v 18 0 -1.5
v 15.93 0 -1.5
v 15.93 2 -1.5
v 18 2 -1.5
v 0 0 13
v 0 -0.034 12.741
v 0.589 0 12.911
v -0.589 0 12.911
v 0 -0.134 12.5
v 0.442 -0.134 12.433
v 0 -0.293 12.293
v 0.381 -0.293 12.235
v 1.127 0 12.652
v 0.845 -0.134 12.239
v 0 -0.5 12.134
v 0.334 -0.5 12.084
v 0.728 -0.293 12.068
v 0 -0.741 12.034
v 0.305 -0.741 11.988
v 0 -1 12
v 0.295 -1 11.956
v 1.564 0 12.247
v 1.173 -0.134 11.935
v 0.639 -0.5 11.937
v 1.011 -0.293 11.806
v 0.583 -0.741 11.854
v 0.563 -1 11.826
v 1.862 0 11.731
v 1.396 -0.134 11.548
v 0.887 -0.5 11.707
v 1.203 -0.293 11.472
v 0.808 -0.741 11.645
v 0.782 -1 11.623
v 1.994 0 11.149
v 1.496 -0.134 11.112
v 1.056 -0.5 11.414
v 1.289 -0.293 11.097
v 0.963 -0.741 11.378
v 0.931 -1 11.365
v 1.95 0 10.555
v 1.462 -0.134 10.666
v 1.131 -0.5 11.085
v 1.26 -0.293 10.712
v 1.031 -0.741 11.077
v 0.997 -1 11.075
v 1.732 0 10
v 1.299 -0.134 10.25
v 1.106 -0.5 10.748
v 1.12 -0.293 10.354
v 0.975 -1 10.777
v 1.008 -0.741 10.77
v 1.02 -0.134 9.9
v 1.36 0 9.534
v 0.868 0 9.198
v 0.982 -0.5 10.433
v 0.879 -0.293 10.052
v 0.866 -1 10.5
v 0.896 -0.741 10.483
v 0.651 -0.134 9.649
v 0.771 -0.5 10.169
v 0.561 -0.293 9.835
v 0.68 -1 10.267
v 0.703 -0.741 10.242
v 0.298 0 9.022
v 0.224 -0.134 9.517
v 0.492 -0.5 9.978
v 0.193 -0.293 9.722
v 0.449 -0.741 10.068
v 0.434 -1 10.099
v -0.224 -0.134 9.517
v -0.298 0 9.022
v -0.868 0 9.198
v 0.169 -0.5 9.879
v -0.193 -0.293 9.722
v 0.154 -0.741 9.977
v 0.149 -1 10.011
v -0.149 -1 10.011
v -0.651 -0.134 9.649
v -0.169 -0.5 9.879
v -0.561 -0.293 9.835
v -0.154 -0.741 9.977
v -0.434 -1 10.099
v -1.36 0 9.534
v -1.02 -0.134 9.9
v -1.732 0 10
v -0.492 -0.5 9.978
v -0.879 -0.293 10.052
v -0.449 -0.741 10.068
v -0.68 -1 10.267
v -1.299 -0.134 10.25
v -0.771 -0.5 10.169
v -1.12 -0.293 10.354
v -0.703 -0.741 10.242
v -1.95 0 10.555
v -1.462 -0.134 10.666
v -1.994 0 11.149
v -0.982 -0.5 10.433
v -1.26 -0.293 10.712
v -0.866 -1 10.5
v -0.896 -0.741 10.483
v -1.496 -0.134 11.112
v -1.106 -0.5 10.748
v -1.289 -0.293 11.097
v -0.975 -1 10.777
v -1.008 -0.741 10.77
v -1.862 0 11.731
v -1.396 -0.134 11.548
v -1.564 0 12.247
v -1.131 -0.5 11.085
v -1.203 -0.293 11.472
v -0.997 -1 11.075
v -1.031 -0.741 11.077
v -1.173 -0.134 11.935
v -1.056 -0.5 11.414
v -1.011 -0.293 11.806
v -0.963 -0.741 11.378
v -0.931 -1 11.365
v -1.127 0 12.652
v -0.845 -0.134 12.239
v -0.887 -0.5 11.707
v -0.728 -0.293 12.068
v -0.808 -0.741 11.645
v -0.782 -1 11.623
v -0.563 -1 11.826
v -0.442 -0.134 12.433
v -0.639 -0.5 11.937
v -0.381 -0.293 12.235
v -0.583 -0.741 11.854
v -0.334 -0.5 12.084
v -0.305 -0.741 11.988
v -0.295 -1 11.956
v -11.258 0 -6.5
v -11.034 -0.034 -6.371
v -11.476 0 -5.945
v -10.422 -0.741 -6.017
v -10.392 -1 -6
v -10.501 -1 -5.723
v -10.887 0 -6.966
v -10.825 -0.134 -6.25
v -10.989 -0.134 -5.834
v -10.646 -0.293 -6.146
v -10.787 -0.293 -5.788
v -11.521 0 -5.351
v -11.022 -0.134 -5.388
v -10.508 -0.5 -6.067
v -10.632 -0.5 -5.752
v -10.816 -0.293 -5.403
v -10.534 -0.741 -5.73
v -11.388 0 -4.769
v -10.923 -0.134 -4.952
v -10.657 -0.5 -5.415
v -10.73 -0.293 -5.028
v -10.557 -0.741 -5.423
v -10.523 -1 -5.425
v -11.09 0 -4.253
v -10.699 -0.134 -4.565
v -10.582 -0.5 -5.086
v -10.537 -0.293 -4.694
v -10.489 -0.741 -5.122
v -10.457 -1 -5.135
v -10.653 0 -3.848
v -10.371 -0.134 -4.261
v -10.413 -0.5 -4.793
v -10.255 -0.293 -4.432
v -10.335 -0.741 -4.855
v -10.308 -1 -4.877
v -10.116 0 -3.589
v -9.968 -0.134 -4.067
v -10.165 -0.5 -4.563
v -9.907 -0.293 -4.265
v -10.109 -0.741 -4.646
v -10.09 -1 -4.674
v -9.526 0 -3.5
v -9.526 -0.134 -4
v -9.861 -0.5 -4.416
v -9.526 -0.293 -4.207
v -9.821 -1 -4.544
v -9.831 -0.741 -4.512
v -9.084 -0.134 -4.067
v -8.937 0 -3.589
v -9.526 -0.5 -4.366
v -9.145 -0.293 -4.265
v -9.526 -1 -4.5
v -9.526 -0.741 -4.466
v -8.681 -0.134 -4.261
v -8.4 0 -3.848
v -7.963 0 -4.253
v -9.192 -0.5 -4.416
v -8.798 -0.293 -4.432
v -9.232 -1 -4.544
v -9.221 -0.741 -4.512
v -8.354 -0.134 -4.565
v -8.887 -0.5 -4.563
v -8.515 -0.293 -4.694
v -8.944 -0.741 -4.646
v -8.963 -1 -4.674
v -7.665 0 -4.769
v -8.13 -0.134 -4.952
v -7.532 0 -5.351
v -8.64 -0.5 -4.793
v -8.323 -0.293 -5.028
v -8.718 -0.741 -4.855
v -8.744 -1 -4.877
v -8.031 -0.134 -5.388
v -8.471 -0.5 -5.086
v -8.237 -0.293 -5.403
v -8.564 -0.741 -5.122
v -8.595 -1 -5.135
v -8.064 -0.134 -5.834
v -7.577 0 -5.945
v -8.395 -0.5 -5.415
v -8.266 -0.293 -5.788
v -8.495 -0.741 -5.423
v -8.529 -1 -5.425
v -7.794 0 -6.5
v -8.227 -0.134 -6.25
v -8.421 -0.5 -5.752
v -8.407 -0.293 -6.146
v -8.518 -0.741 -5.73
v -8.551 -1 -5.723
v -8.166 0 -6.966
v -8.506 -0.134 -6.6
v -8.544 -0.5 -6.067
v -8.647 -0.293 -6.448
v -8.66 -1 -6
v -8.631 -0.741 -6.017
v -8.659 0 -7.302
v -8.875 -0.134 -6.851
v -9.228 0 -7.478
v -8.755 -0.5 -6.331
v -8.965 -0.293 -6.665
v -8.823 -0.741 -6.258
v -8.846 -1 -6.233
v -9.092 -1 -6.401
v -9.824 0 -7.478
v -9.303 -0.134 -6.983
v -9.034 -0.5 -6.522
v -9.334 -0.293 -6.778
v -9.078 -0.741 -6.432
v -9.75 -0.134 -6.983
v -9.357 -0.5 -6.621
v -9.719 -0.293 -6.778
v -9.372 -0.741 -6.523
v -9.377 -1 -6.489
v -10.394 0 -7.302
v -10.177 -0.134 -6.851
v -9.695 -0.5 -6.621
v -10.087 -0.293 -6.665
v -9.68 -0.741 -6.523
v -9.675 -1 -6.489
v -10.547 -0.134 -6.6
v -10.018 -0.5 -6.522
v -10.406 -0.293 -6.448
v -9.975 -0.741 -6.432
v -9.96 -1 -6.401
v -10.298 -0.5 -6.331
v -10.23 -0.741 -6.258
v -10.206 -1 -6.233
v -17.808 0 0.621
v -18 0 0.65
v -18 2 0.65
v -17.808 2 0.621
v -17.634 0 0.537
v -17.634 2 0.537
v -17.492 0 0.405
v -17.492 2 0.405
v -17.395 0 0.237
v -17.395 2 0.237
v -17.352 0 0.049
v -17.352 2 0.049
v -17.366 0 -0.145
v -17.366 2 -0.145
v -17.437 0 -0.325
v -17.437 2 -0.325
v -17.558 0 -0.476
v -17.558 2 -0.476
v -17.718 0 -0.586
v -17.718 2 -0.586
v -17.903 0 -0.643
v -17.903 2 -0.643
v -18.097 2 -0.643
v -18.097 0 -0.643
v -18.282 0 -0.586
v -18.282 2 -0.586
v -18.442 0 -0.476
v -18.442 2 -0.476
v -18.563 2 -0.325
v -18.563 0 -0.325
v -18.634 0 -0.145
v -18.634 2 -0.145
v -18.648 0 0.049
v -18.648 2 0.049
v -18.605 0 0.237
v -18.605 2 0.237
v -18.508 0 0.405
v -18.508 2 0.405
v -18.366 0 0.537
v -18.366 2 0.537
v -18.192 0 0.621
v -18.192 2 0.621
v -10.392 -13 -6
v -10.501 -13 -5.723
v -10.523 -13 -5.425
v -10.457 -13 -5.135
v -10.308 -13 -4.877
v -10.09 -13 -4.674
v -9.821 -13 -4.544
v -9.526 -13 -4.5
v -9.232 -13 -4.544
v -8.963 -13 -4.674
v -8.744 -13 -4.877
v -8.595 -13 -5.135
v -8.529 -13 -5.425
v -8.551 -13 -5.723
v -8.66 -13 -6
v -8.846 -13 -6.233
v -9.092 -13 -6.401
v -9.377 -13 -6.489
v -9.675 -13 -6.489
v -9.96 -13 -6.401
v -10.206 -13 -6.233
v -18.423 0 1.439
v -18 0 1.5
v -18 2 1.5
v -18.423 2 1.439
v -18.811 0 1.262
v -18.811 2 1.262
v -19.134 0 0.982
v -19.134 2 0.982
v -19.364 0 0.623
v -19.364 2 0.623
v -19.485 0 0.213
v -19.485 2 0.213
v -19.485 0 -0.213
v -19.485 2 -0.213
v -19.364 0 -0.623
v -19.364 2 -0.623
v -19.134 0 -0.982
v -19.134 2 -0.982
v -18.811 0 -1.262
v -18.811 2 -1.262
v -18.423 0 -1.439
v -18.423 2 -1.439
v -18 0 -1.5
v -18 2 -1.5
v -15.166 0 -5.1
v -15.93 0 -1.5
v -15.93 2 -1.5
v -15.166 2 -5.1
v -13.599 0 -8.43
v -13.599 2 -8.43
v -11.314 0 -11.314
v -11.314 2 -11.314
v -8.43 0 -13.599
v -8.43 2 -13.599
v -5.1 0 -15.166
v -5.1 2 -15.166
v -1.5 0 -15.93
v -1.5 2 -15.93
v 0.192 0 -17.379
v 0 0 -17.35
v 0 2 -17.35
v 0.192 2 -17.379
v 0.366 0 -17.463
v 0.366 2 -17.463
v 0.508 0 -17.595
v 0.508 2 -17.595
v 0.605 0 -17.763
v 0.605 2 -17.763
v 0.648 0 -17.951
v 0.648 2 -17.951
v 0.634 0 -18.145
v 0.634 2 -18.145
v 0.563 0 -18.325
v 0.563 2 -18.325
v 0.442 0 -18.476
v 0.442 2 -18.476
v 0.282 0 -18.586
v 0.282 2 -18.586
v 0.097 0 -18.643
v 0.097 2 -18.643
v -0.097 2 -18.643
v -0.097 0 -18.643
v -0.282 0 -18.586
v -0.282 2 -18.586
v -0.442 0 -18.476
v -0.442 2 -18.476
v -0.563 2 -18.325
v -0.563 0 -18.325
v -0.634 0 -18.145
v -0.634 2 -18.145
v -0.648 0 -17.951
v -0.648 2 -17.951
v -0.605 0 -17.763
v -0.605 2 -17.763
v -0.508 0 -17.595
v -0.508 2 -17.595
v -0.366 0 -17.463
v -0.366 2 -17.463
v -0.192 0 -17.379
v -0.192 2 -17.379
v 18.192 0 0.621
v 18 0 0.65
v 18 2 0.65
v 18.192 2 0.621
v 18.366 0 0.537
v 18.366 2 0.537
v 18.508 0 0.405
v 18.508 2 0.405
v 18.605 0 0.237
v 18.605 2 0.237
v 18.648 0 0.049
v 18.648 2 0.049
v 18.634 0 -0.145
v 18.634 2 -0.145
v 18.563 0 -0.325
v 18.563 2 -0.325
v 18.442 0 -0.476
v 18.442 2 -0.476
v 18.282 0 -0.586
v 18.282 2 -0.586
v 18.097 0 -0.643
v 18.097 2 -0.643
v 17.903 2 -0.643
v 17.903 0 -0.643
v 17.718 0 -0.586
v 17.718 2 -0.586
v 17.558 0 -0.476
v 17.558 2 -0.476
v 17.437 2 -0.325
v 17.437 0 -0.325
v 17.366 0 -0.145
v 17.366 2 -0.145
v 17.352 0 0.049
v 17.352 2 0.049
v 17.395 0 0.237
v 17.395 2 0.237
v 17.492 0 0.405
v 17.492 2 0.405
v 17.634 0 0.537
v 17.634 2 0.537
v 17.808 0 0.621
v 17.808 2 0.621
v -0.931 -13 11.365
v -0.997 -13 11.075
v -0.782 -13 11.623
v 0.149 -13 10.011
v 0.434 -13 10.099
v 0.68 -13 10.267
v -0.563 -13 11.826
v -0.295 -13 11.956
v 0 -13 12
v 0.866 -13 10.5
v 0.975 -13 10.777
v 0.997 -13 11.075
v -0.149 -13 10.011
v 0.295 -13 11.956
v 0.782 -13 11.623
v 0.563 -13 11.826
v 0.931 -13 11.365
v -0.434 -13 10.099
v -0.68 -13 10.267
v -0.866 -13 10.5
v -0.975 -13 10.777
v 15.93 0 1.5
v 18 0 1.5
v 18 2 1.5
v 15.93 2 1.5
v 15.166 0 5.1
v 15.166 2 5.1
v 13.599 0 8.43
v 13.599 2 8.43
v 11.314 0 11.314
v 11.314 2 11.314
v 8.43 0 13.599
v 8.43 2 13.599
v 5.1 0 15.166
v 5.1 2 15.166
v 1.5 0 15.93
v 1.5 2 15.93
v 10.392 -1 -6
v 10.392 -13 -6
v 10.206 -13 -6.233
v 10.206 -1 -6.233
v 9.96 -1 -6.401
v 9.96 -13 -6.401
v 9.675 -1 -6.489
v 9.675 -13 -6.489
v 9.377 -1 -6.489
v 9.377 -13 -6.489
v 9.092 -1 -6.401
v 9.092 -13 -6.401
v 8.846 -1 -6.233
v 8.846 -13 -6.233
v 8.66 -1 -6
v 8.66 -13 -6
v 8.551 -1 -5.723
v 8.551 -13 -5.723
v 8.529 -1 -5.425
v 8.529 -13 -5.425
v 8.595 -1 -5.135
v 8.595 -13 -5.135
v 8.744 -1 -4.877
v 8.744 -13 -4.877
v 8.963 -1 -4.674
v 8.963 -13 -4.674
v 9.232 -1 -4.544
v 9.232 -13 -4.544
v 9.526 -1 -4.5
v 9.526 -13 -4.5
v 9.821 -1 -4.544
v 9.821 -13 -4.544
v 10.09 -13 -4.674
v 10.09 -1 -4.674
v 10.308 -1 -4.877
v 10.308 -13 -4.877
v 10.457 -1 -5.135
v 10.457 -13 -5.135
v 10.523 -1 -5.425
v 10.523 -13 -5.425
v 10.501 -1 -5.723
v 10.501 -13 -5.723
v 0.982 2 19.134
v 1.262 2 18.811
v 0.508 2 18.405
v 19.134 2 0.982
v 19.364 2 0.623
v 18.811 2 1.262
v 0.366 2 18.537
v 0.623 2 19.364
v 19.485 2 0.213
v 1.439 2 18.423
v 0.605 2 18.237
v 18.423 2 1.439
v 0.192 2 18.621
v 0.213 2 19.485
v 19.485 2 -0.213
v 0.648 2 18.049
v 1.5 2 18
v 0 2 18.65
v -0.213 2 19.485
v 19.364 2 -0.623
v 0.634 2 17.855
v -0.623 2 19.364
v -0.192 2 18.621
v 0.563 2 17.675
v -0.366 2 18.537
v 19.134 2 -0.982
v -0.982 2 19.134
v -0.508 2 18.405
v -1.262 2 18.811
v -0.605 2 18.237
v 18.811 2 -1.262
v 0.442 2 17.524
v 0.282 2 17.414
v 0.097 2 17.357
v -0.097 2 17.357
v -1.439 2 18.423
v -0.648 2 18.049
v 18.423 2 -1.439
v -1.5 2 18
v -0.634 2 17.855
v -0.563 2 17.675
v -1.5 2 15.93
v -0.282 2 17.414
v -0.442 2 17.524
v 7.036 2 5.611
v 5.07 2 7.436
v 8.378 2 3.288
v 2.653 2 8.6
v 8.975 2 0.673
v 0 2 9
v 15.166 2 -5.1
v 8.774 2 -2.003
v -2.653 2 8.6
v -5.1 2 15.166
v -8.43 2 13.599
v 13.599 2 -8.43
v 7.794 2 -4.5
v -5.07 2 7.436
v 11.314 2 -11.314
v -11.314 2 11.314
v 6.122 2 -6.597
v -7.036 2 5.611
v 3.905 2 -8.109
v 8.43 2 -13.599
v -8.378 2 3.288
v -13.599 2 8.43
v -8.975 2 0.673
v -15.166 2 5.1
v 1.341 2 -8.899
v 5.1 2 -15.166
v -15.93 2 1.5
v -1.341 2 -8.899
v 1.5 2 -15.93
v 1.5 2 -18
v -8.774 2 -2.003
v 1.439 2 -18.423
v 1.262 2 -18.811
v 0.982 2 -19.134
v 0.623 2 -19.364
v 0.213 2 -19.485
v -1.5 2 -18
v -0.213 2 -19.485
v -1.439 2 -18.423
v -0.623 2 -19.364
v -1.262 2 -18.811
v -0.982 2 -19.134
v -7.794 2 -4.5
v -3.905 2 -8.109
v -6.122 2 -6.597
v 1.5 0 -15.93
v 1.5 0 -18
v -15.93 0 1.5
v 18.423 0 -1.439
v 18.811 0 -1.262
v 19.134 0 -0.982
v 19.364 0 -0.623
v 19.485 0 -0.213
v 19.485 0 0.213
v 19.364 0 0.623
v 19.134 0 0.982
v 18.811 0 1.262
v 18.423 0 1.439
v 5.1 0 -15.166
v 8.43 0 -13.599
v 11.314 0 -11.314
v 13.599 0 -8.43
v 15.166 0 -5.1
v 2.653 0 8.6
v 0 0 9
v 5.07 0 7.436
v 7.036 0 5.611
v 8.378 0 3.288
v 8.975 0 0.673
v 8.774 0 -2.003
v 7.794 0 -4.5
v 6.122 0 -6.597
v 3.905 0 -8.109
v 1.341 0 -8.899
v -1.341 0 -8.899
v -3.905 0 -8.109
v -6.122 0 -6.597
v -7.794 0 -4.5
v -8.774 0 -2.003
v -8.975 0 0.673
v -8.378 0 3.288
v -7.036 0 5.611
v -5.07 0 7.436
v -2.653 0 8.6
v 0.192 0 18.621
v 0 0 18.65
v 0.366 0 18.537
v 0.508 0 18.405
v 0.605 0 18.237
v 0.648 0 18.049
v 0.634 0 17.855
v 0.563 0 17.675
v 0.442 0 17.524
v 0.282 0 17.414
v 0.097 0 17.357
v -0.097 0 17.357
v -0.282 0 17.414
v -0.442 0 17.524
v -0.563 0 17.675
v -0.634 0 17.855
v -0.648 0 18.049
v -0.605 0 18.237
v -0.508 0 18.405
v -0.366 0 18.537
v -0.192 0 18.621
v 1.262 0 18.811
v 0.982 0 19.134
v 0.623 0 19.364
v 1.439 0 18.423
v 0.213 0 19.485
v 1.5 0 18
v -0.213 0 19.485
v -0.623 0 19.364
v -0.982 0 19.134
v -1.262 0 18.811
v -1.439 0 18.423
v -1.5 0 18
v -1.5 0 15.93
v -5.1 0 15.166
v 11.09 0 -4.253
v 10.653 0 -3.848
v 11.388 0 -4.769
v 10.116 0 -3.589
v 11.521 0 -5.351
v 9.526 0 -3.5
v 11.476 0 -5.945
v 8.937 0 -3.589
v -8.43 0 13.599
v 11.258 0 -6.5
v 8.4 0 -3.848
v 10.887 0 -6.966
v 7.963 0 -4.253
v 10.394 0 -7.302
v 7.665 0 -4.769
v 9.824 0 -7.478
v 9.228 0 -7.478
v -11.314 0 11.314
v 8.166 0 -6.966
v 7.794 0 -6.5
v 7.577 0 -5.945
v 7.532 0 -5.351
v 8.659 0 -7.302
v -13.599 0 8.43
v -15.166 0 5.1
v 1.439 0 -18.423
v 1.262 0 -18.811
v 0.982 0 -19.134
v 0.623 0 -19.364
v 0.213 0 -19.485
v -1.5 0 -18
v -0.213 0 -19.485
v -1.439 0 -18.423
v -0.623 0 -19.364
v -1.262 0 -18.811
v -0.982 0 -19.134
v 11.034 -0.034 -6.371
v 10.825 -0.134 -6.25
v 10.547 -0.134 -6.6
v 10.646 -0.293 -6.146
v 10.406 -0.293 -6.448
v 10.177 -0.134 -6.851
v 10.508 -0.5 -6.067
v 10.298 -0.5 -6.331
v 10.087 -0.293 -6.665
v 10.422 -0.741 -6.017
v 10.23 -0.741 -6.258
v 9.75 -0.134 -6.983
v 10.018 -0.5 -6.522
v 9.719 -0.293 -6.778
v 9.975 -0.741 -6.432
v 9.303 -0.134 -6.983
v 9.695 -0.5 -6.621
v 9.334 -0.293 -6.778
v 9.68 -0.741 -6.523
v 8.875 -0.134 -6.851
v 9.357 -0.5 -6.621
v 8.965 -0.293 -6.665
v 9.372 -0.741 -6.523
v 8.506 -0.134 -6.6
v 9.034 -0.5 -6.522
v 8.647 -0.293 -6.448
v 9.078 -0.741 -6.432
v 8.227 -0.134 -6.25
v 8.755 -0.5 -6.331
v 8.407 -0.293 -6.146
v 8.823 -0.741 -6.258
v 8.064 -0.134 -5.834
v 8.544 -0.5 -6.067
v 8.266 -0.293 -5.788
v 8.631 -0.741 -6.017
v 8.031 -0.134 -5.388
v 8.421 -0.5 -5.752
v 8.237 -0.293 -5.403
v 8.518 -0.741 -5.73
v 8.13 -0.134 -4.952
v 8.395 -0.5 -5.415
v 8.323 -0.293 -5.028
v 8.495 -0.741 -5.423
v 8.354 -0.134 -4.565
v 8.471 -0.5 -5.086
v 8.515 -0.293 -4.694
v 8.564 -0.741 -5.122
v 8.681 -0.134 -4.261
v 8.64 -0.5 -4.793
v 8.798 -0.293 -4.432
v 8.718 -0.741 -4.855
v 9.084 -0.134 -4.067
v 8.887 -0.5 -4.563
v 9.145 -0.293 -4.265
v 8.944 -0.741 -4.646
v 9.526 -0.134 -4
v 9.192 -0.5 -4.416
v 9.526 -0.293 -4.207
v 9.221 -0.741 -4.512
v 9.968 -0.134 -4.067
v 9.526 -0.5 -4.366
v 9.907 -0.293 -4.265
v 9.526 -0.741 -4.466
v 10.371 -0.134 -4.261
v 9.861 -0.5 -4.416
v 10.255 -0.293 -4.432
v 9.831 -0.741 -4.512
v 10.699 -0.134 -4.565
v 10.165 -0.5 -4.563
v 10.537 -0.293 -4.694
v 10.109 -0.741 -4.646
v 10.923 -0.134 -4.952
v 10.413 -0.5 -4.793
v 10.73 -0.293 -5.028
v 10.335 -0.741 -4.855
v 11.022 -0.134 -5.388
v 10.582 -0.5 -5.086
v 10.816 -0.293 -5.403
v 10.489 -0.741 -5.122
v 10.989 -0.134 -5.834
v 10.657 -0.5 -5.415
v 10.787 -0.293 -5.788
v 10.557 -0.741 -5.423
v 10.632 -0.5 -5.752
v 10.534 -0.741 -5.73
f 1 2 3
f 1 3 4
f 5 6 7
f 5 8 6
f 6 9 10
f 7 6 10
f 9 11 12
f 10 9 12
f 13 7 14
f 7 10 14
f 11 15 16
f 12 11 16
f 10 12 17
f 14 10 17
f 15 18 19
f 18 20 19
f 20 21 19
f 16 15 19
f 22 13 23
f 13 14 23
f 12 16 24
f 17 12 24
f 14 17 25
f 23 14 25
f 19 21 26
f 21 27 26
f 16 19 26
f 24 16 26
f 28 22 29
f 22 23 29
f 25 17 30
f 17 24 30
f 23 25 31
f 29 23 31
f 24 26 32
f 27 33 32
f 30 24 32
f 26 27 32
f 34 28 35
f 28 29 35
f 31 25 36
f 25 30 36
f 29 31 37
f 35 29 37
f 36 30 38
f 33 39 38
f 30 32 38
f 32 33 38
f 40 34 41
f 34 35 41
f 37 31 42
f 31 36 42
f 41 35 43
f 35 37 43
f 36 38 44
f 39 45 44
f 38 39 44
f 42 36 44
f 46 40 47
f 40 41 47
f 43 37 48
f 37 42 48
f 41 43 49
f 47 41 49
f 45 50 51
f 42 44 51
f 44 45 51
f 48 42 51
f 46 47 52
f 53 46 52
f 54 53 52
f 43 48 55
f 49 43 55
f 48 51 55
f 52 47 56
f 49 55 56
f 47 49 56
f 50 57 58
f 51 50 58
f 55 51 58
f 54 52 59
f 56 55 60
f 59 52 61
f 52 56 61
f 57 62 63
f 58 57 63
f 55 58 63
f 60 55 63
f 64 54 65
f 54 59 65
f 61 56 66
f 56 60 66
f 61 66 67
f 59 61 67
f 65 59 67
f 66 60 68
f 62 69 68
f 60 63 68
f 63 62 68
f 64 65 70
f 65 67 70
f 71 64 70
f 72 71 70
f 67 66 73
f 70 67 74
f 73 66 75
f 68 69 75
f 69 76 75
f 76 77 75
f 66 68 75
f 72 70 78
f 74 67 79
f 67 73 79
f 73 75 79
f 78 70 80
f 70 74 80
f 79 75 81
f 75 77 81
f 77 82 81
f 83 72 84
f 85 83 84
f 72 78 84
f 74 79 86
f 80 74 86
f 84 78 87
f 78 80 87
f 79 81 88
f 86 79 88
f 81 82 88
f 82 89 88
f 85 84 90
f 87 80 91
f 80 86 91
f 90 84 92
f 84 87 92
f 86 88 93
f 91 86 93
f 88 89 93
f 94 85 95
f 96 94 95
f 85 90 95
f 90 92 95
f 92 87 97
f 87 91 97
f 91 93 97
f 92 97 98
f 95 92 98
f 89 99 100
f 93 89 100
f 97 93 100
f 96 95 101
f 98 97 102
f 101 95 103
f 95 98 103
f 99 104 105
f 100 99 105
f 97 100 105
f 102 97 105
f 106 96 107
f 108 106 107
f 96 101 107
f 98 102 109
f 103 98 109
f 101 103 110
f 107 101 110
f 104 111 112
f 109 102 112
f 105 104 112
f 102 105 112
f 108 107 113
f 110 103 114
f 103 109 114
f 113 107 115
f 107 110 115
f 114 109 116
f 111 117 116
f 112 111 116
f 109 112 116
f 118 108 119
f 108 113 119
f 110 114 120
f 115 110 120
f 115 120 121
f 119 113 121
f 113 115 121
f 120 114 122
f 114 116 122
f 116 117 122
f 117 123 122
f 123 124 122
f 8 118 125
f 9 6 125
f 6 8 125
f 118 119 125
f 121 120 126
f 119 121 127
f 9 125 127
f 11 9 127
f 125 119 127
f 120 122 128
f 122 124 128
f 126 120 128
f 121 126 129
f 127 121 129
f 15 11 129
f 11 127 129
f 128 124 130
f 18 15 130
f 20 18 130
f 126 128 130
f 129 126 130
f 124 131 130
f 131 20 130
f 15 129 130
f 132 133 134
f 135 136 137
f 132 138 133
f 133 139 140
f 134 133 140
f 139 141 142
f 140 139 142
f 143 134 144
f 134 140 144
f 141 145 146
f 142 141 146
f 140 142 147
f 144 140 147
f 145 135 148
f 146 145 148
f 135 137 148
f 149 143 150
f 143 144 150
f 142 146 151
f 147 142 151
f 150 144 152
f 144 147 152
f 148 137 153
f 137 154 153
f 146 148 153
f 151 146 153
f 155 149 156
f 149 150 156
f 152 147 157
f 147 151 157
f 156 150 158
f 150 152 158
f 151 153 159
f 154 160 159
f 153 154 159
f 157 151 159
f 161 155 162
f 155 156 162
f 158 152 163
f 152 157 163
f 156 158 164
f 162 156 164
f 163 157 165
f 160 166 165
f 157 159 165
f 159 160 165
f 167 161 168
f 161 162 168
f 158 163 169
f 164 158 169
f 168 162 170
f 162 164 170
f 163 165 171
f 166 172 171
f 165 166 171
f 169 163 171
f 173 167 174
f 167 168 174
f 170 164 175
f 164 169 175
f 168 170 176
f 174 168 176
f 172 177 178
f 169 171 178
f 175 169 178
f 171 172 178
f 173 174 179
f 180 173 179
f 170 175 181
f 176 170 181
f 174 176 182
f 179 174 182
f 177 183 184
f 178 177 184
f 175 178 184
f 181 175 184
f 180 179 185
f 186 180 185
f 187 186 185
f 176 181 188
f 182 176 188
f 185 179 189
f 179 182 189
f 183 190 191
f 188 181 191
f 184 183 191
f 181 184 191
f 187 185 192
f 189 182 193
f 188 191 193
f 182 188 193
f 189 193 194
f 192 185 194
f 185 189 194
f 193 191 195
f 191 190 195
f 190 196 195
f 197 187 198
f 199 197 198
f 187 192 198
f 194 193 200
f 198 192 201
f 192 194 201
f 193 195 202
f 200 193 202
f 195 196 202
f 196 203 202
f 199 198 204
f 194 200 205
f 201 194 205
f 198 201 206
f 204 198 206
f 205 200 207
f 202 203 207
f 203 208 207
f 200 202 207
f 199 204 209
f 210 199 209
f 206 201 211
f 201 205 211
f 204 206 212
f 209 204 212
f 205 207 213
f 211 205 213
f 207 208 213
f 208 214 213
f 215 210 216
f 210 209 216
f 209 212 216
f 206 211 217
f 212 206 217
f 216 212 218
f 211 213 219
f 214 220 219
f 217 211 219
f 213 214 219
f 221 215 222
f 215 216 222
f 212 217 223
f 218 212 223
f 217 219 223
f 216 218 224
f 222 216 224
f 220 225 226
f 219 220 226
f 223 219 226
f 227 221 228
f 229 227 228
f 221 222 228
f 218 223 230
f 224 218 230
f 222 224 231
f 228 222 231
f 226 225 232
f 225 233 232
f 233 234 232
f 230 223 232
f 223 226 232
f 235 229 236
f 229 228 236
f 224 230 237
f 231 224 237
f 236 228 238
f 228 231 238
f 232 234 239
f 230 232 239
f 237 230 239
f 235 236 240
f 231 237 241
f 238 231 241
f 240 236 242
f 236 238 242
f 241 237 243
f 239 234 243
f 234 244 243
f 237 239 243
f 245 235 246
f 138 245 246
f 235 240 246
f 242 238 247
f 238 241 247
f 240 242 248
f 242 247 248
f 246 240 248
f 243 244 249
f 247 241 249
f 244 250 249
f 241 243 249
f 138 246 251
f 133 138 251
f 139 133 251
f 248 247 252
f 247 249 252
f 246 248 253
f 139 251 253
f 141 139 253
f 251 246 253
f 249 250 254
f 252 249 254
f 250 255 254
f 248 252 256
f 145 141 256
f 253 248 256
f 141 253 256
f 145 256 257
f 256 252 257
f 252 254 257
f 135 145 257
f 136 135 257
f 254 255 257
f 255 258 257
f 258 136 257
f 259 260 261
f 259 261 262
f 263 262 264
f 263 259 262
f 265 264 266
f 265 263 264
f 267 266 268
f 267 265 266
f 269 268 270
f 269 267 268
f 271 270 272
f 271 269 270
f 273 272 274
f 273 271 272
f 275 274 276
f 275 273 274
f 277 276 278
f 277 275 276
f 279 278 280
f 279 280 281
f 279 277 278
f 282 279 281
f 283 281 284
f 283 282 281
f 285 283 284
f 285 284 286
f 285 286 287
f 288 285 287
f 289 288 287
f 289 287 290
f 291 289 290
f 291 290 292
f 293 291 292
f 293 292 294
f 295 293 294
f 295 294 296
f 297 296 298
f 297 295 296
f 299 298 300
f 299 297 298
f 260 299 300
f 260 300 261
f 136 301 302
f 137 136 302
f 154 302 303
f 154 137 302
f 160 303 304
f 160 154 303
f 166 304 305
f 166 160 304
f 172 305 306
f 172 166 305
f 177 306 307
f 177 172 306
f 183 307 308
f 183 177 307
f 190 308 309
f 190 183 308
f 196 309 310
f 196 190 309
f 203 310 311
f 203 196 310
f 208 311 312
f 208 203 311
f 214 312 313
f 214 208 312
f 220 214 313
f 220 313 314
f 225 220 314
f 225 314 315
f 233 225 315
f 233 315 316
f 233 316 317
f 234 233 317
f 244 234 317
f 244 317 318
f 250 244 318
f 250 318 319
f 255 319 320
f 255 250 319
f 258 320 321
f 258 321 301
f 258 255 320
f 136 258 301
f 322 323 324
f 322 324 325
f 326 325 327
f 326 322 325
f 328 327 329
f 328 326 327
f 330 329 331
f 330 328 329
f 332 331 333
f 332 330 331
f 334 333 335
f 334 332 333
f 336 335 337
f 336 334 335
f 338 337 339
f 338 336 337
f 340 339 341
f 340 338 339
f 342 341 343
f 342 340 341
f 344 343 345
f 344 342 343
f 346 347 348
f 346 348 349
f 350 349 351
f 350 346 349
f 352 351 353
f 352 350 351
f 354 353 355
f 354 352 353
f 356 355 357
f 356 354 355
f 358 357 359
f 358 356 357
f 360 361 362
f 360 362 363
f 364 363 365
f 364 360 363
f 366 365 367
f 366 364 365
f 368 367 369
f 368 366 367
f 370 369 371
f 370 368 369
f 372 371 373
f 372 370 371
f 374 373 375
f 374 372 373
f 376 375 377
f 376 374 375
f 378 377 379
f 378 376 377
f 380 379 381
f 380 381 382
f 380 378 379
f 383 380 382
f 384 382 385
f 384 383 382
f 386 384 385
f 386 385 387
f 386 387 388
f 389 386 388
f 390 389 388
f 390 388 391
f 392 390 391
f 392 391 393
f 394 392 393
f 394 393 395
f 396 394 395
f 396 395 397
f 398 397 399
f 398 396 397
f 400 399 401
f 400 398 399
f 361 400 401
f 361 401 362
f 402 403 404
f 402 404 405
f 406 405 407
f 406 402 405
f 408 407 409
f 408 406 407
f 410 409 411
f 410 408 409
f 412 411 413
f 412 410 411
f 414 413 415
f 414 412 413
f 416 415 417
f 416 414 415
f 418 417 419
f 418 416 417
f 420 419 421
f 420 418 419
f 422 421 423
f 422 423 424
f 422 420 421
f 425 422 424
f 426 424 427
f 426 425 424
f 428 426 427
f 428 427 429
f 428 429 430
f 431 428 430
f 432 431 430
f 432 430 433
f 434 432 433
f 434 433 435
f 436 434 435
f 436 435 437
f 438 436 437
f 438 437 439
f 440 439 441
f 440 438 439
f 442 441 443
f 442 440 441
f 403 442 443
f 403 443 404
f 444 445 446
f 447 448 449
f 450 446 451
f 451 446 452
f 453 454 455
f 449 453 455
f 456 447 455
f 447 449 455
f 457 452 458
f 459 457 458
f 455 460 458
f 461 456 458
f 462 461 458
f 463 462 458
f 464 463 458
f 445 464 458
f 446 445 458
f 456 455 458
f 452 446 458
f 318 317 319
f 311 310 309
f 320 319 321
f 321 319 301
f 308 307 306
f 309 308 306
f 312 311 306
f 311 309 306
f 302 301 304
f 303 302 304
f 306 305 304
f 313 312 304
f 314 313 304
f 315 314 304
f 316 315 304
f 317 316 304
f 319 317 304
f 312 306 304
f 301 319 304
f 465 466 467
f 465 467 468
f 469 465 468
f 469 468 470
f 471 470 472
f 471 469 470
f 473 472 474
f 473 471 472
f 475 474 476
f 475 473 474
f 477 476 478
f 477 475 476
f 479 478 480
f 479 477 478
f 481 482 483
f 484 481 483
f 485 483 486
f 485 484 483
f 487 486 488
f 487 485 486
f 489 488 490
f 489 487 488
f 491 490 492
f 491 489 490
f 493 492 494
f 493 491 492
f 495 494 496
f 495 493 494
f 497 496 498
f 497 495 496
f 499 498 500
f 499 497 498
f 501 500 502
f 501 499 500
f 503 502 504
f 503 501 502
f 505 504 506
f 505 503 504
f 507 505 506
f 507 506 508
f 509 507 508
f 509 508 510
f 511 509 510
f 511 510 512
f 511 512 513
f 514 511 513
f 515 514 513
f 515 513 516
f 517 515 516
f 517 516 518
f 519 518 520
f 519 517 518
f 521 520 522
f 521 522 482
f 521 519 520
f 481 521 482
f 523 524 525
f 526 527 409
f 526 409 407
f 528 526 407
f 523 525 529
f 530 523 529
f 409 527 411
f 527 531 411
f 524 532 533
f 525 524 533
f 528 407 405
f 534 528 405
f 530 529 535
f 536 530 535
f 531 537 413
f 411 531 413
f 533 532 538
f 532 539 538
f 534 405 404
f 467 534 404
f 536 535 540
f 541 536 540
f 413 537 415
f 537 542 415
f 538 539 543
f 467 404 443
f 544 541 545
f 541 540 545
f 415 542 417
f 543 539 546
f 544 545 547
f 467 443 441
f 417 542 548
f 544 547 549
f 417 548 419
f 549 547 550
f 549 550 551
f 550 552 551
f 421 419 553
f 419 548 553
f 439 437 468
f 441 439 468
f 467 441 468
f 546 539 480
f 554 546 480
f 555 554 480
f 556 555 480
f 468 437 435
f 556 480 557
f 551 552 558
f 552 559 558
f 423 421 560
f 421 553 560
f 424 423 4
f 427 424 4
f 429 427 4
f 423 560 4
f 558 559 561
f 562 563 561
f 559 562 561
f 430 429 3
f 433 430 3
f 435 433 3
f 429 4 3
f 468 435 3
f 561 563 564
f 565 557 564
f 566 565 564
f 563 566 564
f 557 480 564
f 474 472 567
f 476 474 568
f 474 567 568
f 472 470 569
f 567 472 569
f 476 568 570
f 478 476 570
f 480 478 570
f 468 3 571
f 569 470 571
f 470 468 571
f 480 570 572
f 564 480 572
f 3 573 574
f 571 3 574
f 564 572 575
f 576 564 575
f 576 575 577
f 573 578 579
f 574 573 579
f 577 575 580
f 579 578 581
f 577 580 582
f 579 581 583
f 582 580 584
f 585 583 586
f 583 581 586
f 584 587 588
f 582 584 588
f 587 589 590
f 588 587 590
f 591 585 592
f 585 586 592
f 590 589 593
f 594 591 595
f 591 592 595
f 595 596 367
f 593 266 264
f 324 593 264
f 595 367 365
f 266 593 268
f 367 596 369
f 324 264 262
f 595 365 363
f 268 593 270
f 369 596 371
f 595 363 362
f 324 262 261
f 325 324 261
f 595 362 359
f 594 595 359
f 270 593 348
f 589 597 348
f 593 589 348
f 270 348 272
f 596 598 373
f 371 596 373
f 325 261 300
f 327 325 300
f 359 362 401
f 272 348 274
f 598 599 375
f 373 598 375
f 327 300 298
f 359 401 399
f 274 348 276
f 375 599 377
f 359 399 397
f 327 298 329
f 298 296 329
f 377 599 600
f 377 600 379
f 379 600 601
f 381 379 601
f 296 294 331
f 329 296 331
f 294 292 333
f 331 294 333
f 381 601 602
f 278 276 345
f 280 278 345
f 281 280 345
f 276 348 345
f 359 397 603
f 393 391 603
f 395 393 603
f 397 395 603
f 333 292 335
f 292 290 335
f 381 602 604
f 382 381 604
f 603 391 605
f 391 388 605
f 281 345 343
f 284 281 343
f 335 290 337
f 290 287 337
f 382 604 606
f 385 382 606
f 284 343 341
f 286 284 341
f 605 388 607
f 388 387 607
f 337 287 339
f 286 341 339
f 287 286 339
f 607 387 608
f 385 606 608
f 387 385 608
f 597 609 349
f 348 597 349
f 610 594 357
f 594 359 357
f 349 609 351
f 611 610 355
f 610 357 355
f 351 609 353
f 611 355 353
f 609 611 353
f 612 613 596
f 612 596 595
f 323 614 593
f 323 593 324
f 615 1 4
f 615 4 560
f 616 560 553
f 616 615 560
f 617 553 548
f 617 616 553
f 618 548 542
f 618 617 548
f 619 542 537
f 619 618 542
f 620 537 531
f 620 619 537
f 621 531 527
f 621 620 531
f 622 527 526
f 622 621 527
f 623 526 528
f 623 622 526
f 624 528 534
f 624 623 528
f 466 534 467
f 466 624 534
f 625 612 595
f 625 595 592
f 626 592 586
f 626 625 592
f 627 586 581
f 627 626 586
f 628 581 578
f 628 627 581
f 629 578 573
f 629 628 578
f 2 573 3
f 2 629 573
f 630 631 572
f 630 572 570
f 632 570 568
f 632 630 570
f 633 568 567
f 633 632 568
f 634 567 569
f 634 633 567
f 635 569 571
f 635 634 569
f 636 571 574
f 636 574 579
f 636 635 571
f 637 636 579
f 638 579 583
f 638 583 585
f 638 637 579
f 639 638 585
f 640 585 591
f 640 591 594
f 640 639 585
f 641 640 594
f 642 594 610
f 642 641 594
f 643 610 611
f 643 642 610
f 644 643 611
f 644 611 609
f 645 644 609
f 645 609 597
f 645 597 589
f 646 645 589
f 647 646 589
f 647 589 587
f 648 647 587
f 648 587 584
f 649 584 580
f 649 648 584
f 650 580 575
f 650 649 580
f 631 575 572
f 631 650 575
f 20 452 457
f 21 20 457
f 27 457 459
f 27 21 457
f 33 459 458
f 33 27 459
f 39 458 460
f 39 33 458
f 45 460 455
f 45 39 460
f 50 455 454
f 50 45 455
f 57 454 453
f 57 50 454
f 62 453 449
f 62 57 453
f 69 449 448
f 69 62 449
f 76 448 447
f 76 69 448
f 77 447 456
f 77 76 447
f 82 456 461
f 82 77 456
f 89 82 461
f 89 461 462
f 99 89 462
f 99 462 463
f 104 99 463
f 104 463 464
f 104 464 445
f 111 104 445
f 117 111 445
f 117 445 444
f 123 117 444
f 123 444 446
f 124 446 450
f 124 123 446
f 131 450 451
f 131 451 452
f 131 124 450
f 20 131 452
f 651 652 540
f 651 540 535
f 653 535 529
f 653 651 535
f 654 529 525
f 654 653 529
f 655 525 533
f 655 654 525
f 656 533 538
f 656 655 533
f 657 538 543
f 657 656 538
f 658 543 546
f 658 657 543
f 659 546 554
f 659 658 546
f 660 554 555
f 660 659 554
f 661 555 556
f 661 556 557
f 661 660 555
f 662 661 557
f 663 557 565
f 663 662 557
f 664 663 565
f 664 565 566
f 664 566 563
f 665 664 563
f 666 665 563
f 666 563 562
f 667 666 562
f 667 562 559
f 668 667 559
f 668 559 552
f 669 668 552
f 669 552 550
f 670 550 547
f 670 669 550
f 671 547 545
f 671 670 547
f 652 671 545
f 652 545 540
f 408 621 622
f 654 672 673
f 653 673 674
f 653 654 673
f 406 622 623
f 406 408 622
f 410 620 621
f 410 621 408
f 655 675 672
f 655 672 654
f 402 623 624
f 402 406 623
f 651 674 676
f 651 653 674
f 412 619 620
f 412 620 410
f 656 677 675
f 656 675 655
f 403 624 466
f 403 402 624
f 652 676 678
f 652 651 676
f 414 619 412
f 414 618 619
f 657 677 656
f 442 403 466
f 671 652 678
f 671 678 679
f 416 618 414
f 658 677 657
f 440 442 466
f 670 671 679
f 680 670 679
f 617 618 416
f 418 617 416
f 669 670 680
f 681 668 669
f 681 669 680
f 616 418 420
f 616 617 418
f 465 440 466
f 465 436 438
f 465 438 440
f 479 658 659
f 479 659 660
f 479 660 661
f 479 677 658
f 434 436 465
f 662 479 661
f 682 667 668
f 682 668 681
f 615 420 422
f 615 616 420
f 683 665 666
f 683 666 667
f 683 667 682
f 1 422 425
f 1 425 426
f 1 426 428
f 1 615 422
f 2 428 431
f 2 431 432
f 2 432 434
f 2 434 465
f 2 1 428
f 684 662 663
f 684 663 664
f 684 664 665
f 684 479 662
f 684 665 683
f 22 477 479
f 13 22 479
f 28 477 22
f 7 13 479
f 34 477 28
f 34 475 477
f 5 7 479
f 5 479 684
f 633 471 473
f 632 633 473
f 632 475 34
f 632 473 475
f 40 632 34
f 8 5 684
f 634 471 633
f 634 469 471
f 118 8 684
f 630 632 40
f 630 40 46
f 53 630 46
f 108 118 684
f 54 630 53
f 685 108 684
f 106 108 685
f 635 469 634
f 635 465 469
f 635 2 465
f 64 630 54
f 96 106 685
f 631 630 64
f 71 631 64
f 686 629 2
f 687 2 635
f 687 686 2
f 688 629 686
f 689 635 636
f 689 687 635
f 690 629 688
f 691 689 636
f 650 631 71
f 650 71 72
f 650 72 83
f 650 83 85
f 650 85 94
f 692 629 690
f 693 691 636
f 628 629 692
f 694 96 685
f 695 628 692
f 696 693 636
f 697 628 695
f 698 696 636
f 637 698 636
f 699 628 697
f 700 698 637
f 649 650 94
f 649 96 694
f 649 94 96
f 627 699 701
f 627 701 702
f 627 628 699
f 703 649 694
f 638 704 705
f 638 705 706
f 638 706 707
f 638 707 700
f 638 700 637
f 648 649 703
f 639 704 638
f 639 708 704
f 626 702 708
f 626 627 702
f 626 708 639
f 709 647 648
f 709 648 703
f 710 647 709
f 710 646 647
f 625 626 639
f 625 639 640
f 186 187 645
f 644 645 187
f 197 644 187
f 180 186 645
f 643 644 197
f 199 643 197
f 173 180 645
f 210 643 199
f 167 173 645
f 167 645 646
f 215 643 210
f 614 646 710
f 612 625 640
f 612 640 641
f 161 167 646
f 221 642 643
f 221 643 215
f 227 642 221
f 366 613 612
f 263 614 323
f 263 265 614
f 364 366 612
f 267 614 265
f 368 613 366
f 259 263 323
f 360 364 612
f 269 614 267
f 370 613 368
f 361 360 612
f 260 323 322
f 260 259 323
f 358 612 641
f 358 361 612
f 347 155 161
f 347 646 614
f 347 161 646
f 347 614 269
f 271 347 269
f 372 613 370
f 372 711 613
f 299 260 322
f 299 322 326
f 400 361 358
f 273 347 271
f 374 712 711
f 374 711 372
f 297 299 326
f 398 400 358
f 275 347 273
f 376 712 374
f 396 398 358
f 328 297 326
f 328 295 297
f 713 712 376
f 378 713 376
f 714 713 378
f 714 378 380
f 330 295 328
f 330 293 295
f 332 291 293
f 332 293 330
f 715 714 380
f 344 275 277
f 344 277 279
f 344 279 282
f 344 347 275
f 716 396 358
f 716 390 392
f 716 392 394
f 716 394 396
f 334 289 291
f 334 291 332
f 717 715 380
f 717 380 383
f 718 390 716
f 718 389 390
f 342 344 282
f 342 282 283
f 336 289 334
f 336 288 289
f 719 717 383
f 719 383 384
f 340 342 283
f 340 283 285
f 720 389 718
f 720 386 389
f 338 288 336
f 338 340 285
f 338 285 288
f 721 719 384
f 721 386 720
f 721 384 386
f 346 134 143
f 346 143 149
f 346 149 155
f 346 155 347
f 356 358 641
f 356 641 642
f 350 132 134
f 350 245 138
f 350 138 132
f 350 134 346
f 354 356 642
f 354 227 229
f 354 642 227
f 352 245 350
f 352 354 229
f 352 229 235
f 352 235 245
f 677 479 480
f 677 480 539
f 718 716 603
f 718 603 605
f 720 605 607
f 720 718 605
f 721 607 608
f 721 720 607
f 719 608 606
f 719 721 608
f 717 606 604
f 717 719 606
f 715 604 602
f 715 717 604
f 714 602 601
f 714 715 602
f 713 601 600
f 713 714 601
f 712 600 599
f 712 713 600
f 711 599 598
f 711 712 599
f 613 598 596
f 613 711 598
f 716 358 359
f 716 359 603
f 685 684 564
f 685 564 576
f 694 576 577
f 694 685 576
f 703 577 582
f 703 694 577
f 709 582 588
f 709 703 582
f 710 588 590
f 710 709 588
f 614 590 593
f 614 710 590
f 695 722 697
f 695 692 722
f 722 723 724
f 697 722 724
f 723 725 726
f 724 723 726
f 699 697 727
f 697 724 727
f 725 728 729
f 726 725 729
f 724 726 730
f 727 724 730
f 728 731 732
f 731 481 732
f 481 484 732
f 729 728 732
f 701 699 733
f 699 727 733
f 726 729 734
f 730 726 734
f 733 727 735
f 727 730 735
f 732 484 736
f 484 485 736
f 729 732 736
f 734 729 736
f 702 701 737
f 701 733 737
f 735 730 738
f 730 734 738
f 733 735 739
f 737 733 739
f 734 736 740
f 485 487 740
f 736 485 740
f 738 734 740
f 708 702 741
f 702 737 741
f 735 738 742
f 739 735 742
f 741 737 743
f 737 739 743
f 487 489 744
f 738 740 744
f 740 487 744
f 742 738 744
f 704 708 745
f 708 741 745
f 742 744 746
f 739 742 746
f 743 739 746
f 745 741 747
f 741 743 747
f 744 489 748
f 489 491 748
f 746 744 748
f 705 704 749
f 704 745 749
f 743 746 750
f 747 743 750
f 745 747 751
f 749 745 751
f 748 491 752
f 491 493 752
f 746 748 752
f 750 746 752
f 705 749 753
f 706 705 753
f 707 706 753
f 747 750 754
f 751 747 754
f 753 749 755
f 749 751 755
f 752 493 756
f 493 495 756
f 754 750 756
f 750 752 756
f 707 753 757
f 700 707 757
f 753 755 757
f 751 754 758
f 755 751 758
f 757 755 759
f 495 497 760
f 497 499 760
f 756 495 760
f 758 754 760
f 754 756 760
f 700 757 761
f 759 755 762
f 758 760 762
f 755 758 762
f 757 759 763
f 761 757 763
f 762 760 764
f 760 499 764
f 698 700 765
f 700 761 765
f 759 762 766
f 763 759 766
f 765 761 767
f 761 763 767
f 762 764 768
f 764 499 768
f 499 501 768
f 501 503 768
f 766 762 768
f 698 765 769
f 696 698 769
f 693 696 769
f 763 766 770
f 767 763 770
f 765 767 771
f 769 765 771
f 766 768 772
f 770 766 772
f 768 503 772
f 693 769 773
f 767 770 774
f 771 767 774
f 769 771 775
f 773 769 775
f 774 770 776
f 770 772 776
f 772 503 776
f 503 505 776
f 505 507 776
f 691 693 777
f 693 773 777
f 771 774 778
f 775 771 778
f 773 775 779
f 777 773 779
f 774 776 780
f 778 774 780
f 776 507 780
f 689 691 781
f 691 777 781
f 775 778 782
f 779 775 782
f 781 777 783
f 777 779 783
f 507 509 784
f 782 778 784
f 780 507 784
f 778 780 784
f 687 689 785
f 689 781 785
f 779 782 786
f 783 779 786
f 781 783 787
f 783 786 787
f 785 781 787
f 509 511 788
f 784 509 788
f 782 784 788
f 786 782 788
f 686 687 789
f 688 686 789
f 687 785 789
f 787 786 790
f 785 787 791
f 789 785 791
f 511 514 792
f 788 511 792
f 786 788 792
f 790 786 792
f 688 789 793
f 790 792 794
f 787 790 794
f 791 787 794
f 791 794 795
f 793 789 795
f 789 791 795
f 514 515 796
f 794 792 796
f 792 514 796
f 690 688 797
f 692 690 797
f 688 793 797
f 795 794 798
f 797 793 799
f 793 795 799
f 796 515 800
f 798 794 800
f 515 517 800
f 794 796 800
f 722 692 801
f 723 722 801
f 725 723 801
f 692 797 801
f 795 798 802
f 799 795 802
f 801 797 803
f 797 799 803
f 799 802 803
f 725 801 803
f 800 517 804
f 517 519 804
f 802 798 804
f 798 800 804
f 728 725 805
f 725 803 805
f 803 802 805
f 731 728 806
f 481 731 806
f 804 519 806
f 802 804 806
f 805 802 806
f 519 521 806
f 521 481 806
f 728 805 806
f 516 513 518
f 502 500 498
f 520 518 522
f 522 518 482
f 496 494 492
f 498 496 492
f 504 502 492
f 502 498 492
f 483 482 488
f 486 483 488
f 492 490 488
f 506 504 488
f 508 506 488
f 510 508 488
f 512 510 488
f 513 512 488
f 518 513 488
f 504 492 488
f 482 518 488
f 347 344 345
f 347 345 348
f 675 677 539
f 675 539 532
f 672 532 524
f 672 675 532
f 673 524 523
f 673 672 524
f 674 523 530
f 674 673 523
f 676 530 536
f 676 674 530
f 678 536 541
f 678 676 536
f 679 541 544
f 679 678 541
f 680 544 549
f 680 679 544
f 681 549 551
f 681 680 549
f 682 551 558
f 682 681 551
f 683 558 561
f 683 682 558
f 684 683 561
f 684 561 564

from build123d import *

# Parameters (mm, degrees)
SKETCH1_R           = 1
BOSS_EXTRUDE1_DEPTH = 13
SKETCH2_R           = 9
SKETCH2_R_2         = 0.65
BOSS_EXTRUDE2_DEPTH = 2
CIRPATTERN2_COUNT   = 3
FILLET1_R           = 1


with BuildPart() as part:
    # Sketch1 → Boss-Extrude1 (new body)
    with BuildSketch(Plane(origin=(0, 0, 0), x_dir=(1, 0, 0), z_dir=(0, 1, 0))):
        with Locations(Location((0, -11, 0), (0, 0, 270))):
            Circle(SKETCH1_R)
    boss_extrude1 = extrude(amount=-BOSS_EXTRUDE1_DEPTH)

    # Sketch2 → Boss-Extrude2 (add)
    with BuildSketch(Plane(origin=(0, 0, 0), x_dir=(1, 0, 0), z_dir=(0, 1, 0))):
        with BuildLine():
            Line((-18, 1.5), (-15.929532322, 1.5))
            ThreePointArc((-15.929532322, 1.5), (-11.313708499, 11.313708499), (-1.5, 15.929532322))
            Line((-1.5, 15.929532322), (-1.5, 18))
            ThreePointArc((-1.5, 18), (0, 19.5), (1.5, 18))
            Line((1.5, 18), (1.5, 15.929532322))
            ThreePointArc((1.5, 15.929532322), (11.313708499, 11.313708499), (15.929532322, 1.5))
            Line((15.929532322, 1.5), (18, 1.5))
            ThreePointArc((18, 1.5), (19.5, 0), (18, -1.5))
            Line((18, -1.5), (15.929532322, -1.5))
            ThreePointArc((15.929532322, -1.5), (11.313708499, -11.313708499), (1.5, -15.929532322))
            Line((1.5, -15.929532322), (1.5, -18))
            ThreePointArc((1.5, -18), (0, -19.5), (-1.5, -18))
            Line((-1.5, -18), (-1.5, -15.929532322))
            ThreePointArc((-1.5, -15.929532322), (-11.313708499, -11.313708499), (-15.929532322, -1.5))
            Line((-15.929532322, -1.5), (-18, -1.5))
            ThreePointArc((-18, -1.5), (-19.5, 0), (-18, 1.5))
        make_face()
        with Locations(Location((0, 0, 0), (0, 0, 270))):
            Circle(SKETCH2_R, mode=Mode.SUBTRACT)
        with Locations(Location((0, 18, 0), (0, 0, 270))):
            Circle(SKETCH2_R_2, mode=Mode.SUBTRACT)
        with Locations(Location((18, 0, 0), (0, 0, 270))):
            Circle(SKETCH2_R_2, mode=Mode.SUBTRACT)
        with Locations(Location((-18, 0, 0), (0, 0, 270))):
            Circle(SKETCH2_R_2, mode=Mode.SUBTRACT)
        with Locations(Location((0, -18, 0), (0, 0, 270))):
            Circle(SKETCH2_R_2, mode=Mode.SUBTRACT)
    extrude(amount=BOSS_EXTRUDE2_DEPTH)

    # CirPattern2: Boss-Extrude1 ×3 about axis
    cirpattern2_axis = Axis((0, 0, 0), (0, 1, 0))
    for i in range(1, CIRPATTERN2_COUNT):
        add(boss_extrude1.rotate(cirpattern2_axis, i * 360 / CIRPATTERN2_COUNT))

    # Fillet1
    fillet1_edges = [part.edges().sort_by_distance(p)[0] for p in [
        (0, 0, 10),
        (8.660254038, 0, -5),
        (-8.660254038, 0, -5),
    ]]
    fillet(fillet1_edges, radius=FILLET1_R - 0.0001)  # a hair under: the kernel refuses the full size


solid = part.part
